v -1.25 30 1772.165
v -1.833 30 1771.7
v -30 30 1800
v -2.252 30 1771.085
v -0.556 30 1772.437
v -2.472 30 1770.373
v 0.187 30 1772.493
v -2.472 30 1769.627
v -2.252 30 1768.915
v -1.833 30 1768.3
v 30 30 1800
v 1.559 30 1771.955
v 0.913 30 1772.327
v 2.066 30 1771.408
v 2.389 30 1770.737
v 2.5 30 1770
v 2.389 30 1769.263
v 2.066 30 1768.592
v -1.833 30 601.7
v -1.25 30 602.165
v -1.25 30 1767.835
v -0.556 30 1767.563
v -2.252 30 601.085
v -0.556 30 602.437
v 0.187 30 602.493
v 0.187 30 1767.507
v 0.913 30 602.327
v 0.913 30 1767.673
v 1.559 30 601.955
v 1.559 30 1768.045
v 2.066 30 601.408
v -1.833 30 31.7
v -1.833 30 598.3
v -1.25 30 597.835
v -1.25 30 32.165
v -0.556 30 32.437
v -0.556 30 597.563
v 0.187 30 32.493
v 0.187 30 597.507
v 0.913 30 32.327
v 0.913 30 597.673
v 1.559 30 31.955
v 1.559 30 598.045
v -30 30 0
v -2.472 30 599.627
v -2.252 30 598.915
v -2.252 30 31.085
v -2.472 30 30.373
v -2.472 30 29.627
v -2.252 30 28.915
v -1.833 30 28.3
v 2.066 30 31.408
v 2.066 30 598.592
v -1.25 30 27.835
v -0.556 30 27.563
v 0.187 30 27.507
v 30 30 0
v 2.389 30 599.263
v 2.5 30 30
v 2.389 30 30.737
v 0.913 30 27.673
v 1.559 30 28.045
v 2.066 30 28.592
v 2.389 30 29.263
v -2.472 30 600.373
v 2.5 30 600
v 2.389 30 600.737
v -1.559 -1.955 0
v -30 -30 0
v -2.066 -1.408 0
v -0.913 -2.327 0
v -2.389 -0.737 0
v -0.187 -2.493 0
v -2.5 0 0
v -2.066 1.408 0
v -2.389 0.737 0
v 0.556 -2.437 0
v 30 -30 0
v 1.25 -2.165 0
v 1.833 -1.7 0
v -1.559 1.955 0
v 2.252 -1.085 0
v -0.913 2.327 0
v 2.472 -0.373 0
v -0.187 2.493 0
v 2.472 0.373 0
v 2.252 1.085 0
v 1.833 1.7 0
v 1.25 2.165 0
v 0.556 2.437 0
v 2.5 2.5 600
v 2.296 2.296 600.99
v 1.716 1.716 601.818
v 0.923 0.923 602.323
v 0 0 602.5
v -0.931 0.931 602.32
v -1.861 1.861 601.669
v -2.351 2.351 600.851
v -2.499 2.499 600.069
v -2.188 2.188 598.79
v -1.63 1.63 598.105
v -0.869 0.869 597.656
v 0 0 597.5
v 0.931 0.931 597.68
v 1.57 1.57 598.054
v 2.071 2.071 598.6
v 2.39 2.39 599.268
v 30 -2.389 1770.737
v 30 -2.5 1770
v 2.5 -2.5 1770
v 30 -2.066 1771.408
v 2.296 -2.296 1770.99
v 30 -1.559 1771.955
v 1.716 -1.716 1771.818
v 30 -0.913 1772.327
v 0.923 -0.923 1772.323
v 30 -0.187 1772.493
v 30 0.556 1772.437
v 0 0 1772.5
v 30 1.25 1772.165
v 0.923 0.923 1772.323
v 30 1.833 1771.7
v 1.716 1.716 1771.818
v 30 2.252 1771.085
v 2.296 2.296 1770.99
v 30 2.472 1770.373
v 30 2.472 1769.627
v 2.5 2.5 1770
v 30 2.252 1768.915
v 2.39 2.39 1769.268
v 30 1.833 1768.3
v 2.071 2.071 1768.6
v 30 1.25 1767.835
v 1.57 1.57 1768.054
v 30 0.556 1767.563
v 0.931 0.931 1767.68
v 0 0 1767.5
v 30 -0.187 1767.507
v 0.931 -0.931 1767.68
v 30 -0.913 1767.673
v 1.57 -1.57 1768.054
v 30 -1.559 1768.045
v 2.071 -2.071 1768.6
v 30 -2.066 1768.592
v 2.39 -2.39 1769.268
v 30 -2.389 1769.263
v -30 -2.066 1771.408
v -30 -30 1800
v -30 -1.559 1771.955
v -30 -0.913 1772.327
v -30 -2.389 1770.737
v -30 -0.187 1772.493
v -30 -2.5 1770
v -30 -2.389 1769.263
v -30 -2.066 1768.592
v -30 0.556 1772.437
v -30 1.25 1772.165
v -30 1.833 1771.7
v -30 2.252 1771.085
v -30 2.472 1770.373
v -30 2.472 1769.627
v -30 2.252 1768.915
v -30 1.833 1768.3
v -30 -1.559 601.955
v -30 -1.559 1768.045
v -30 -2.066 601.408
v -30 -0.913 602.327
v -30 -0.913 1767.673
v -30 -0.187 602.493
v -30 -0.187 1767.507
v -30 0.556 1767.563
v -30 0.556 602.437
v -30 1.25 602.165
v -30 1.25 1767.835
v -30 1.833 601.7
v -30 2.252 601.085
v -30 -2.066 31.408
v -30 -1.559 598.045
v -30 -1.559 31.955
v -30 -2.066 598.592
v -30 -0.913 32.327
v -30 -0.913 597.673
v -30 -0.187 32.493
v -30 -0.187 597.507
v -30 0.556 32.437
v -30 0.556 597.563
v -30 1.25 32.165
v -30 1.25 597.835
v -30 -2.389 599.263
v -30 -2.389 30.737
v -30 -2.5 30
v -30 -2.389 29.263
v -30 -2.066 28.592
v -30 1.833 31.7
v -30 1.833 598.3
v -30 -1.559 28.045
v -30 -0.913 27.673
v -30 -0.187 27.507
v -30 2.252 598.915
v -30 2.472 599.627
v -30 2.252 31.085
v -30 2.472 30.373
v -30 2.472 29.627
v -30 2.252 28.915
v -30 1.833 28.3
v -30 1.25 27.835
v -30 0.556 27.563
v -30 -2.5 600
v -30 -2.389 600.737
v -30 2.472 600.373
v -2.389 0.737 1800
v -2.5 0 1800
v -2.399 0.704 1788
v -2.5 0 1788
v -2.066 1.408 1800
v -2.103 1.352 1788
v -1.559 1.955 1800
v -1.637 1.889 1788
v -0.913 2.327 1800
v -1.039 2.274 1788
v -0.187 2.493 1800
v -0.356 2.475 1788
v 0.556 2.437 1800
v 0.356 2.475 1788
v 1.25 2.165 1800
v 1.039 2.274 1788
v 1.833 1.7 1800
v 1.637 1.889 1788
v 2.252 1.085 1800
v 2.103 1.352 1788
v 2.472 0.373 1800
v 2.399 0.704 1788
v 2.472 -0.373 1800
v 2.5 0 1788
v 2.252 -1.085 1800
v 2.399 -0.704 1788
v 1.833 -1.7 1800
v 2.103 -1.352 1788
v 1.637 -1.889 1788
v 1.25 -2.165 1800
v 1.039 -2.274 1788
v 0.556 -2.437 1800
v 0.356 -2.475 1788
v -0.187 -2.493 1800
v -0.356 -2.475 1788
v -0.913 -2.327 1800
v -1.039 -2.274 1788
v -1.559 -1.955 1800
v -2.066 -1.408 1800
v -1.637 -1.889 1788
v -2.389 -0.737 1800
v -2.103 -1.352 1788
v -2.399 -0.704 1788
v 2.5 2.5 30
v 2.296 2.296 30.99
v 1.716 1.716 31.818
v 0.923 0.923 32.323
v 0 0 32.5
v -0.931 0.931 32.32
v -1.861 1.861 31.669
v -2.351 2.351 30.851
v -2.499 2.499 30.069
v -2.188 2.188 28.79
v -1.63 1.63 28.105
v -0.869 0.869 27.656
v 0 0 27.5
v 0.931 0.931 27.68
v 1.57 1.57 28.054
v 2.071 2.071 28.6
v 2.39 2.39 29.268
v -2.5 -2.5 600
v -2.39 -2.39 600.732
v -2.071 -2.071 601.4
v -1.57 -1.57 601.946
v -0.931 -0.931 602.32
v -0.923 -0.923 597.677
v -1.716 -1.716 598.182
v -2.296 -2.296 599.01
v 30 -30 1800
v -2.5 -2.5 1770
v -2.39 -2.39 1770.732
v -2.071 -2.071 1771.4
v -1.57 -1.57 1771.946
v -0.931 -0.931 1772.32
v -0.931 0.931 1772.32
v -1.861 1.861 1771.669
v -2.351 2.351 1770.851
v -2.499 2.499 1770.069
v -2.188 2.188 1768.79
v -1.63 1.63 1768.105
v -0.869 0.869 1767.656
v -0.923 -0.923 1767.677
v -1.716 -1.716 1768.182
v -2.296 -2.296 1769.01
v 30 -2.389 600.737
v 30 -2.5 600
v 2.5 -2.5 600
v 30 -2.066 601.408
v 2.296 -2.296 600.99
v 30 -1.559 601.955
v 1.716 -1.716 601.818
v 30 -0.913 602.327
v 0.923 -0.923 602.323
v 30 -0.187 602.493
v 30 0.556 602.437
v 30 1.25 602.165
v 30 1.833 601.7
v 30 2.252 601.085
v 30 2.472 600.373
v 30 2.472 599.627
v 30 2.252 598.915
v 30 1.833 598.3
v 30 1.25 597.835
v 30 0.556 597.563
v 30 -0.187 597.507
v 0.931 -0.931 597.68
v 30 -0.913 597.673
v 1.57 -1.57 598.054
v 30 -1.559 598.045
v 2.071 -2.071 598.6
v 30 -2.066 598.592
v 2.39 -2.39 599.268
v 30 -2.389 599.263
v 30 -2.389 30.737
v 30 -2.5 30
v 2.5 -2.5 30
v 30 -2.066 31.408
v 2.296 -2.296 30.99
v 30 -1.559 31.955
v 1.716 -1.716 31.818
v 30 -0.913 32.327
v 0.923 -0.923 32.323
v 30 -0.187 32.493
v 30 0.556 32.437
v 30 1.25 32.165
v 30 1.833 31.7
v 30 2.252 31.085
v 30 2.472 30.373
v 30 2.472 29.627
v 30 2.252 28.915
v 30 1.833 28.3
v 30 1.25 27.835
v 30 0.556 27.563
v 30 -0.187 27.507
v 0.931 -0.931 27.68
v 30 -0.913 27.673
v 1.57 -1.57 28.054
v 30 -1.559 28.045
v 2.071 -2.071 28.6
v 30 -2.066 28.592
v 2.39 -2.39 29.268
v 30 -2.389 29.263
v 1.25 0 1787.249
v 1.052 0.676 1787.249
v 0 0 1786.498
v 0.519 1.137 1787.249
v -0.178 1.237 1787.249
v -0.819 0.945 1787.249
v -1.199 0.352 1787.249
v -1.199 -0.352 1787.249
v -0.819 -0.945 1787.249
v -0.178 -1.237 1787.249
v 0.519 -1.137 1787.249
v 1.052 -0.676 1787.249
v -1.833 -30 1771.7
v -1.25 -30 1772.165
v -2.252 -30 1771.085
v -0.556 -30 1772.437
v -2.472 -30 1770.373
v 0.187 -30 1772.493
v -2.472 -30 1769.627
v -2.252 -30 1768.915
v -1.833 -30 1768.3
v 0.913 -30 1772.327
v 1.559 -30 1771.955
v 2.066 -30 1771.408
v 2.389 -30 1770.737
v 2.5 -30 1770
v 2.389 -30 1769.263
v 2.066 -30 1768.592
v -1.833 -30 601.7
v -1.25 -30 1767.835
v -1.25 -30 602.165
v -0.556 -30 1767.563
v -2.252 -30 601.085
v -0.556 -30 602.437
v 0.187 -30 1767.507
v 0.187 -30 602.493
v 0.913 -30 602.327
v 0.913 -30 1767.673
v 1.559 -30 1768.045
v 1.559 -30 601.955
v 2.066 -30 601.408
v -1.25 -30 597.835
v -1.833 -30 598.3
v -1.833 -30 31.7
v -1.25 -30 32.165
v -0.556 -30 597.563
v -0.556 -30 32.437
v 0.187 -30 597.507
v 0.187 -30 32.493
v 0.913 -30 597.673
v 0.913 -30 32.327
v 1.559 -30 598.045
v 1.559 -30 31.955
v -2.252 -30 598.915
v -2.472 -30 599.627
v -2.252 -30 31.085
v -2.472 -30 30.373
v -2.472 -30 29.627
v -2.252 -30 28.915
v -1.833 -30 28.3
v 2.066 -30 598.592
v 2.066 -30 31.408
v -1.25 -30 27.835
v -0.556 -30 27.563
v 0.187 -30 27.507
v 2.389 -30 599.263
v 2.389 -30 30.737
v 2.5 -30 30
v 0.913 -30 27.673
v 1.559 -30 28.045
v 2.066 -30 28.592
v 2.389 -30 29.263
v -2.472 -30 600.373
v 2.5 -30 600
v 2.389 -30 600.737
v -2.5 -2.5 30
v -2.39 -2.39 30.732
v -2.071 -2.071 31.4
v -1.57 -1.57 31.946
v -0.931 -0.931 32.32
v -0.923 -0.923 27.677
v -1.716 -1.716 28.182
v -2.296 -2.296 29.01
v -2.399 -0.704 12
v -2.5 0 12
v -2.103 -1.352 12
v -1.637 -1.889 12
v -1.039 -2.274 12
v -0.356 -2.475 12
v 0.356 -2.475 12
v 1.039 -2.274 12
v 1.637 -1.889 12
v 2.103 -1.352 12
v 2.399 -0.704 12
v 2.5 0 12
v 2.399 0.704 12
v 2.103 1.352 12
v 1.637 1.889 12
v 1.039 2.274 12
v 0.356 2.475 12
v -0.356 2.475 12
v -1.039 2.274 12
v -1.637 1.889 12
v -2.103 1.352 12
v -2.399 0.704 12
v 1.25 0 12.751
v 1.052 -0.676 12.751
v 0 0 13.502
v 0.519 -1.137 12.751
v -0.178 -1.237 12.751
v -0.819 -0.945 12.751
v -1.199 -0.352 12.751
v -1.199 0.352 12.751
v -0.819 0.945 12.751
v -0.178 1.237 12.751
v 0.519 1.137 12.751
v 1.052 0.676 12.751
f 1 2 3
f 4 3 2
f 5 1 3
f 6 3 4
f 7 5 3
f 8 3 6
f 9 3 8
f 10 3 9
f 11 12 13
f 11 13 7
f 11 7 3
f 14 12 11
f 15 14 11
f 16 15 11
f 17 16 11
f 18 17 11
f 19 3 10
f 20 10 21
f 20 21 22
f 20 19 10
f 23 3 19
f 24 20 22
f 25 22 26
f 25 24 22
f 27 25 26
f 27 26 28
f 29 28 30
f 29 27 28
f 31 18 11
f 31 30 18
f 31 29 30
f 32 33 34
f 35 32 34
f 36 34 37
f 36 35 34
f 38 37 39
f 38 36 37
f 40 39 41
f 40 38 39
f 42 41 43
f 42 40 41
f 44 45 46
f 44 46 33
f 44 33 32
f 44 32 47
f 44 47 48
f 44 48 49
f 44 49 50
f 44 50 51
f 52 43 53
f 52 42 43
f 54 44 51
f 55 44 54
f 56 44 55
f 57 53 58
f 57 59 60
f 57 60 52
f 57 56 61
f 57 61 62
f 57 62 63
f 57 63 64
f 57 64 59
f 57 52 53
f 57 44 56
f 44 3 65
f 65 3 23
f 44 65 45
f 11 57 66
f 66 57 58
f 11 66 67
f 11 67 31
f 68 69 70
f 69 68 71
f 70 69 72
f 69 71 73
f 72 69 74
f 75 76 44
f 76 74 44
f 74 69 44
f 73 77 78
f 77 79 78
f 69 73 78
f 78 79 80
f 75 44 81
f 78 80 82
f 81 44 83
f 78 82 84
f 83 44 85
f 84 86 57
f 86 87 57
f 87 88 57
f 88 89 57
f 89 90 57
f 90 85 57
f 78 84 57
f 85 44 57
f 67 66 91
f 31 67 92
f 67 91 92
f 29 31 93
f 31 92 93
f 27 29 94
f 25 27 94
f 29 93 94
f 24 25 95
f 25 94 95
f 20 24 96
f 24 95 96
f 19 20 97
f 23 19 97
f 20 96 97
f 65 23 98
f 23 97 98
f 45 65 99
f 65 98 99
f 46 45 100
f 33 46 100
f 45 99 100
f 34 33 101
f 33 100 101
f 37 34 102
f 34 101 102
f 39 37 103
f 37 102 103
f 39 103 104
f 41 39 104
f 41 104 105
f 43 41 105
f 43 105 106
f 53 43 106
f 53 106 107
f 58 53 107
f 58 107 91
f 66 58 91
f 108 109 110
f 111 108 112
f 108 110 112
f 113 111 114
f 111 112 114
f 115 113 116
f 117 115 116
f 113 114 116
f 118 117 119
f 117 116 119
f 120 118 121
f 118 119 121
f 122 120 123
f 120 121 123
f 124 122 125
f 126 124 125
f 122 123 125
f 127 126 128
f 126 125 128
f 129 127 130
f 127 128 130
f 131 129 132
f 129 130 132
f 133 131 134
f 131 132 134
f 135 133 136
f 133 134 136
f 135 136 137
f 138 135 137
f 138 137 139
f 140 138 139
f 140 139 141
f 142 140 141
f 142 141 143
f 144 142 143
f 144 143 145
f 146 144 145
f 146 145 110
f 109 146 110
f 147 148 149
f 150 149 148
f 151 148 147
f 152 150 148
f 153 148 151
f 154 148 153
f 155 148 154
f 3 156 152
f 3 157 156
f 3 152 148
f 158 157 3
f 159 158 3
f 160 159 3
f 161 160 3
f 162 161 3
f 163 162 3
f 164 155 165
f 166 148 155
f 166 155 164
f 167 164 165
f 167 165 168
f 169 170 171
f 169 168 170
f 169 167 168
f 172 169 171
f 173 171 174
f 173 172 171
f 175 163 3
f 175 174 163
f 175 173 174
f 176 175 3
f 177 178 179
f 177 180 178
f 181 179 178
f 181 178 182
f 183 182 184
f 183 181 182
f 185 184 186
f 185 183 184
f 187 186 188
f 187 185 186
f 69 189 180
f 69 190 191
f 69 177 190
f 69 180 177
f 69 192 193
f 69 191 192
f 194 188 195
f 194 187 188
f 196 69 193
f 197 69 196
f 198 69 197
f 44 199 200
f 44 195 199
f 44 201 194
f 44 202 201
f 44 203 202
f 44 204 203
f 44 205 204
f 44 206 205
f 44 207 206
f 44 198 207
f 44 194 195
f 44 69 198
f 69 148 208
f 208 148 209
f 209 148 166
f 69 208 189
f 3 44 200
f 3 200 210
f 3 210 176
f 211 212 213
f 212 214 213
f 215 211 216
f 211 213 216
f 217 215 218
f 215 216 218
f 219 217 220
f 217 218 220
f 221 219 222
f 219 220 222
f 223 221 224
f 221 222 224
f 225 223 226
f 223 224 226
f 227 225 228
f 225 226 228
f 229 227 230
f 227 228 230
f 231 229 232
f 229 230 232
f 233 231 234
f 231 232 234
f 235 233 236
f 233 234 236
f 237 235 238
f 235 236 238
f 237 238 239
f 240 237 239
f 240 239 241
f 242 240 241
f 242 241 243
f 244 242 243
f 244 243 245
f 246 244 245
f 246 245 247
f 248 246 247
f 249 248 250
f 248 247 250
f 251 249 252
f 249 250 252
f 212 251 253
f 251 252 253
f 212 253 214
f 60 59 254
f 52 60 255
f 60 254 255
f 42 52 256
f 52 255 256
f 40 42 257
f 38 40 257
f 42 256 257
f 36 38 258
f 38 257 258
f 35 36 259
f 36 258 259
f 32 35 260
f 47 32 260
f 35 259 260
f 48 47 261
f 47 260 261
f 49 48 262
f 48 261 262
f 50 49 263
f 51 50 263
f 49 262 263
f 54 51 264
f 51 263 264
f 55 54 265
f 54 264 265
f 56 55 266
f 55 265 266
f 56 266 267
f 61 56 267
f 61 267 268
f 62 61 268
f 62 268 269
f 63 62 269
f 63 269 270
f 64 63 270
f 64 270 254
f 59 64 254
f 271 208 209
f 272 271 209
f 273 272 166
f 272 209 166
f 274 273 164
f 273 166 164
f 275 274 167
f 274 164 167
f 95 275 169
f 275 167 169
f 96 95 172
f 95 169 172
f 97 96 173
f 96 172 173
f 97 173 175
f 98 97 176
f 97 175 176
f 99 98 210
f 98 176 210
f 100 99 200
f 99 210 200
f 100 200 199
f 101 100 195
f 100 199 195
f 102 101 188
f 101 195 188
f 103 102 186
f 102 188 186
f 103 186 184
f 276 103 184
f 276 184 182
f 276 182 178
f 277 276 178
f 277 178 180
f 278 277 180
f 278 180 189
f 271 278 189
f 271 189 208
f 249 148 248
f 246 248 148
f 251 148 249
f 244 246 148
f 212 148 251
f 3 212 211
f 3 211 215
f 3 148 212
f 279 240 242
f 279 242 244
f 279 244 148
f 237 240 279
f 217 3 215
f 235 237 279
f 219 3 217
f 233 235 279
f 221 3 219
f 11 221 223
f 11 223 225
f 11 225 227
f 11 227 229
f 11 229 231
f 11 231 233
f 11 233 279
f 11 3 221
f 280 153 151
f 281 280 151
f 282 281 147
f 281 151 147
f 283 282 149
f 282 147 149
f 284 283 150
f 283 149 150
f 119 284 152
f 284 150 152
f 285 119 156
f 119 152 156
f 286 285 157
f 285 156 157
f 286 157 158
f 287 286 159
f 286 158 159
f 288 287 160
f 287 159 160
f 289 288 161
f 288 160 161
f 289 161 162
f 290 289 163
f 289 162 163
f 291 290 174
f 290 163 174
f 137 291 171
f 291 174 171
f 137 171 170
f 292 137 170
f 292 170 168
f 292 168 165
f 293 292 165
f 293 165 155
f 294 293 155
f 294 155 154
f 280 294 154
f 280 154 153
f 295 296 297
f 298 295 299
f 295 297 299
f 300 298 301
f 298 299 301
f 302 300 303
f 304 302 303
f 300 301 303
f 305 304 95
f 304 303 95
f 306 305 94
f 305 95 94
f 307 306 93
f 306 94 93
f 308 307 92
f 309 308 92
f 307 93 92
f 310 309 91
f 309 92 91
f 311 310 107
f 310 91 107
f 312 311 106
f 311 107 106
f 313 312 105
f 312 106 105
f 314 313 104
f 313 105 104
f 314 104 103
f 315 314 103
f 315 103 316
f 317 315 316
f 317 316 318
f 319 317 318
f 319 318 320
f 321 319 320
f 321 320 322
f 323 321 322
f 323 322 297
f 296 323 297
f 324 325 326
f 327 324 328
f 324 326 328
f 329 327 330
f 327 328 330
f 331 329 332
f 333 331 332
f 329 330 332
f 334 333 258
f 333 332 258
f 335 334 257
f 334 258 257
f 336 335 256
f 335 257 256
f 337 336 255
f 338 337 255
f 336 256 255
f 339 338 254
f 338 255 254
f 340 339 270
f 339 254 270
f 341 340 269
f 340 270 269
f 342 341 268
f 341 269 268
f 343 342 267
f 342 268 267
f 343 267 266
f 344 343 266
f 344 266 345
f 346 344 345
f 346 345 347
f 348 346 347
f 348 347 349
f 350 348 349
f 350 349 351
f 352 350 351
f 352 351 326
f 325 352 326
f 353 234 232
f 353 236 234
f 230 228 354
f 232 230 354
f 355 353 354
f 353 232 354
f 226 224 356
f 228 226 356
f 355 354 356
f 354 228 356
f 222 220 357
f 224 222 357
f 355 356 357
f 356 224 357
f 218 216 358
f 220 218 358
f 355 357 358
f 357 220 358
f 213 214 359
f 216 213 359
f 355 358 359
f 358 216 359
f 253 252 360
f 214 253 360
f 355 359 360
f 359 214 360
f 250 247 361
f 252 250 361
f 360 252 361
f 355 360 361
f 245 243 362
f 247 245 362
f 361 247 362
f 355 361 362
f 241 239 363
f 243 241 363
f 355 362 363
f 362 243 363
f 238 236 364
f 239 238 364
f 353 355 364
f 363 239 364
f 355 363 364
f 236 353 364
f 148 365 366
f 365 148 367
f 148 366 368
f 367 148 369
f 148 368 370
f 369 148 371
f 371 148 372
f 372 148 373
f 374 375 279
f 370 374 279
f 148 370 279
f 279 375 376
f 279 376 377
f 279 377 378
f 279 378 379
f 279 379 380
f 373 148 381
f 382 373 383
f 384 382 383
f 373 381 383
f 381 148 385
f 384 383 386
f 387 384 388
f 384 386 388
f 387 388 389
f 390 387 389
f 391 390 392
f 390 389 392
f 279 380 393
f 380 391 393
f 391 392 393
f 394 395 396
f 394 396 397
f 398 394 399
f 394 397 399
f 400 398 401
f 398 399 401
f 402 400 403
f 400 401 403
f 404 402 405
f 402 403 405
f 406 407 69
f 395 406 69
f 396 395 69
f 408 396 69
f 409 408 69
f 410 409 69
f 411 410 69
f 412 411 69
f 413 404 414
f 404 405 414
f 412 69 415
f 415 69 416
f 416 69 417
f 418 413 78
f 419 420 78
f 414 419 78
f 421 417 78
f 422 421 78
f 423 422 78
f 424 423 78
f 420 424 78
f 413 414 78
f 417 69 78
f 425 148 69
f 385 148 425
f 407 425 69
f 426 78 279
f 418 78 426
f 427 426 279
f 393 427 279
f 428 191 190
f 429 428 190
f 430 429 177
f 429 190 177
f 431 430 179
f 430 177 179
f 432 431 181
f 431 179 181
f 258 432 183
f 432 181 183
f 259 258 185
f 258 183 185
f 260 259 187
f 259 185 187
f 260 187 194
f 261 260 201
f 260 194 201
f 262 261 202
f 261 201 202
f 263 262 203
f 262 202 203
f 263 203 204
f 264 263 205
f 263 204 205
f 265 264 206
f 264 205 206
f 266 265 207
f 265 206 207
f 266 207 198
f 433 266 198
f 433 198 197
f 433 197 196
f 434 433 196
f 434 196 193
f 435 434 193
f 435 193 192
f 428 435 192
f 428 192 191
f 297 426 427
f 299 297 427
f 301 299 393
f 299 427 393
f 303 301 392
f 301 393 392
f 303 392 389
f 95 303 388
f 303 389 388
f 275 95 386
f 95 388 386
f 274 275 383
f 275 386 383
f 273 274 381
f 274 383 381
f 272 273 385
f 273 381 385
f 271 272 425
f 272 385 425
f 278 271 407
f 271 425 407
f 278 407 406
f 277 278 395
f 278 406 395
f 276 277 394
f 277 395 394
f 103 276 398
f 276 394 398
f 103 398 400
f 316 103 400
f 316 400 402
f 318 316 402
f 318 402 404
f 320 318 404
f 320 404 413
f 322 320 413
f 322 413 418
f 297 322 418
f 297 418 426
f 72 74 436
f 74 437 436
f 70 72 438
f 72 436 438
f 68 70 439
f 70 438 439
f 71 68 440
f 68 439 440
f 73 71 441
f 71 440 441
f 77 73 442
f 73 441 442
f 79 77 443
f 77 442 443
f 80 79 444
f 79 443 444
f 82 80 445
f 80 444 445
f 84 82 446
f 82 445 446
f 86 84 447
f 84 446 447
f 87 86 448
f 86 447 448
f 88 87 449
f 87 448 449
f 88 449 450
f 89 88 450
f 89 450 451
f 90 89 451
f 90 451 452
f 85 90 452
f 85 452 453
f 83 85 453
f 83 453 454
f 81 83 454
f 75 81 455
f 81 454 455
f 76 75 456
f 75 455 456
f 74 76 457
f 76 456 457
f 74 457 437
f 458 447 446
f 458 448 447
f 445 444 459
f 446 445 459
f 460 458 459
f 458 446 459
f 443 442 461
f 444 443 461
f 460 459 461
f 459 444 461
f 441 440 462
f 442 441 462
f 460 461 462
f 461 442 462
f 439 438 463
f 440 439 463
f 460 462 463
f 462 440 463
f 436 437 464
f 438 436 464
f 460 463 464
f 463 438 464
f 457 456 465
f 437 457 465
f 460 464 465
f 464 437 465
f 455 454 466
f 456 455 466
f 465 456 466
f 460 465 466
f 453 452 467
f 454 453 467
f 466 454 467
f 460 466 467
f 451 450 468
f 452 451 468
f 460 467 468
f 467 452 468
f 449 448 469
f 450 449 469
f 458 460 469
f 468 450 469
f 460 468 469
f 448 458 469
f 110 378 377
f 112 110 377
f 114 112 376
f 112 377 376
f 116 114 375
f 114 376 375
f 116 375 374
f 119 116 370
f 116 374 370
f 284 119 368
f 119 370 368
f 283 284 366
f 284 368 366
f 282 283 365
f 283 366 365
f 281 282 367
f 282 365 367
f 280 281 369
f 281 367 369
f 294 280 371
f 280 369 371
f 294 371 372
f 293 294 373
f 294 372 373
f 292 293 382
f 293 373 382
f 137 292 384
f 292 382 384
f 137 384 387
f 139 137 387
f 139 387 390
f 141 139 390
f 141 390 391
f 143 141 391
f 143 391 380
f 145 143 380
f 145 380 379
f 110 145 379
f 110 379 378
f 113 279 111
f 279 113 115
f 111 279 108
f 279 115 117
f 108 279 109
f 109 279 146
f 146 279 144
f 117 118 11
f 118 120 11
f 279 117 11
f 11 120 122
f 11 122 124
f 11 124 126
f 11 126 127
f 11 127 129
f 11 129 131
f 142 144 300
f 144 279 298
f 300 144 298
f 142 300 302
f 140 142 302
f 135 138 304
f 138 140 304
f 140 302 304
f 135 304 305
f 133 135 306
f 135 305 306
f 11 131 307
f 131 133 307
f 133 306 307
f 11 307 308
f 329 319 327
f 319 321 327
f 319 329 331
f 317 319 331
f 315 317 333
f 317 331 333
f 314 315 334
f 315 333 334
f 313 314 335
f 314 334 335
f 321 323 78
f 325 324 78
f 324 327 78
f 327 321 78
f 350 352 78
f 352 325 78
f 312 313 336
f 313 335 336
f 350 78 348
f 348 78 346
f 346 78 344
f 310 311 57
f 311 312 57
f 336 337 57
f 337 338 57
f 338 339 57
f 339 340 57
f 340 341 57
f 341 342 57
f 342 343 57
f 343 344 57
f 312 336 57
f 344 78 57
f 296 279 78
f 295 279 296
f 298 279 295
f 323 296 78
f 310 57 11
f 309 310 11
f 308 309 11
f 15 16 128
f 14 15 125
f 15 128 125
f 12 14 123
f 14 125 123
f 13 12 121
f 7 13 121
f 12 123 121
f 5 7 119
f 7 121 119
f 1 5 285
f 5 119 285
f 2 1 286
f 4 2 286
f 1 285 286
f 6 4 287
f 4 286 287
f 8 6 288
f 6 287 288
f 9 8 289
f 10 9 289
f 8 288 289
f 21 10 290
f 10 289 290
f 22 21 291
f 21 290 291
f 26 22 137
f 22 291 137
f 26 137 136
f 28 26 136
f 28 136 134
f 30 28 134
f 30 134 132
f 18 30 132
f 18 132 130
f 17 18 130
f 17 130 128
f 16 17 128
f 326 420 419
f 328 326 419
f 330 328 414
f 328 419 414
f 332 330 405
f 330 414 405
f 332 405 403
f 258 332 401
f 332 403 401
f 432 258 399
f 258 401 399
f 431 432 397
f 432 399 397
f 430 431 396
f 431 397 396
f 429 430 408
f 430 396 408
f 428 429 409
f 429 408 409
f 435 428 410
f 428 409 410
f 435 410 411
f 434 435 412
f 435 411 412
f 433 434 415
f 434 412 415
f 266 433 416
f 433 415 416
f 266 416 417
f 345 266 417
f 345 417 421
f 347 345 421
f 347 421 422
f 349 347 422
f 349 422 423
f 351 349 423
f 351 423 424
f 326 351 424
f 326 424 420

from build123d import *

# Parameters (mm, degrees)
F1_W           = 60
F1_H           = 60
F2_DEPTH       = 1800
F7_D           = 5
F7_DEPTH       = 12
F7_TIP         = 1.5021515476
F7_ON_F4_D     = 5
F7_ON_F4_DEPTH = 12
F7_ON_F4_TIP   = 1.5021515476
F8_D           = 5
F8_ON_F5_D     = 5


with BuildPart() as f2:
    # F1 (on Top) → F2 (new body)
    with BuildSketch(Plane.XY):
        Rectangle(F1_W, F1_H)
    extrude(amount=F2_DEPTH)

    # F7
    with Locations(Plane.XY.offset(1800)):
        with Locations((0, 0)):
            Hole(F7_D / 2, depth=F7_DEPTH)
            with Locations((0, 0, -(F7_DEPTH + F7_TIP / 2))):  # 118° drill point
                Cone(0, F7_D / 2, F7_TIP, mode=Mode.SUBTRACT)

    # F7 on F4
    with Locations(Plane(origin=(0, 0, 0), x_dir=(1, 0, 0), z_dir=(0, 0, -1))):
        with Locations((0, 0)):
            Hole(F7_ON_F4_D / 2, depth=F7_ON_F4_DEPTH)
            with Locations((0, 0, -(F7_ON_F4_DEPTH + F7_ON_F4_TIP / 2))):  # 118° drill point
                Cone(0, F7_ON_F4_D / 2, F7_ON_F4_TIP, mode=Mode.SUBTRACT)

    # F8 (through all)
    with Locations(Plane(origin=(0, 30, 0), x_dir=(-1, 0, 0), z_dir=(0, 1, 0))):
        with Locations((0, 1770), (0, 30), (0, 600)):
            Hole(F8_D / 2)

    # F8 on F5 (through all)
    with Locations(Plane.YZ.offset(30)):
        with Locations((0, 1770), (0, 30), (0, 600)):
            Hole(F8_ON_F5_D / 2)


solid = f2.part
